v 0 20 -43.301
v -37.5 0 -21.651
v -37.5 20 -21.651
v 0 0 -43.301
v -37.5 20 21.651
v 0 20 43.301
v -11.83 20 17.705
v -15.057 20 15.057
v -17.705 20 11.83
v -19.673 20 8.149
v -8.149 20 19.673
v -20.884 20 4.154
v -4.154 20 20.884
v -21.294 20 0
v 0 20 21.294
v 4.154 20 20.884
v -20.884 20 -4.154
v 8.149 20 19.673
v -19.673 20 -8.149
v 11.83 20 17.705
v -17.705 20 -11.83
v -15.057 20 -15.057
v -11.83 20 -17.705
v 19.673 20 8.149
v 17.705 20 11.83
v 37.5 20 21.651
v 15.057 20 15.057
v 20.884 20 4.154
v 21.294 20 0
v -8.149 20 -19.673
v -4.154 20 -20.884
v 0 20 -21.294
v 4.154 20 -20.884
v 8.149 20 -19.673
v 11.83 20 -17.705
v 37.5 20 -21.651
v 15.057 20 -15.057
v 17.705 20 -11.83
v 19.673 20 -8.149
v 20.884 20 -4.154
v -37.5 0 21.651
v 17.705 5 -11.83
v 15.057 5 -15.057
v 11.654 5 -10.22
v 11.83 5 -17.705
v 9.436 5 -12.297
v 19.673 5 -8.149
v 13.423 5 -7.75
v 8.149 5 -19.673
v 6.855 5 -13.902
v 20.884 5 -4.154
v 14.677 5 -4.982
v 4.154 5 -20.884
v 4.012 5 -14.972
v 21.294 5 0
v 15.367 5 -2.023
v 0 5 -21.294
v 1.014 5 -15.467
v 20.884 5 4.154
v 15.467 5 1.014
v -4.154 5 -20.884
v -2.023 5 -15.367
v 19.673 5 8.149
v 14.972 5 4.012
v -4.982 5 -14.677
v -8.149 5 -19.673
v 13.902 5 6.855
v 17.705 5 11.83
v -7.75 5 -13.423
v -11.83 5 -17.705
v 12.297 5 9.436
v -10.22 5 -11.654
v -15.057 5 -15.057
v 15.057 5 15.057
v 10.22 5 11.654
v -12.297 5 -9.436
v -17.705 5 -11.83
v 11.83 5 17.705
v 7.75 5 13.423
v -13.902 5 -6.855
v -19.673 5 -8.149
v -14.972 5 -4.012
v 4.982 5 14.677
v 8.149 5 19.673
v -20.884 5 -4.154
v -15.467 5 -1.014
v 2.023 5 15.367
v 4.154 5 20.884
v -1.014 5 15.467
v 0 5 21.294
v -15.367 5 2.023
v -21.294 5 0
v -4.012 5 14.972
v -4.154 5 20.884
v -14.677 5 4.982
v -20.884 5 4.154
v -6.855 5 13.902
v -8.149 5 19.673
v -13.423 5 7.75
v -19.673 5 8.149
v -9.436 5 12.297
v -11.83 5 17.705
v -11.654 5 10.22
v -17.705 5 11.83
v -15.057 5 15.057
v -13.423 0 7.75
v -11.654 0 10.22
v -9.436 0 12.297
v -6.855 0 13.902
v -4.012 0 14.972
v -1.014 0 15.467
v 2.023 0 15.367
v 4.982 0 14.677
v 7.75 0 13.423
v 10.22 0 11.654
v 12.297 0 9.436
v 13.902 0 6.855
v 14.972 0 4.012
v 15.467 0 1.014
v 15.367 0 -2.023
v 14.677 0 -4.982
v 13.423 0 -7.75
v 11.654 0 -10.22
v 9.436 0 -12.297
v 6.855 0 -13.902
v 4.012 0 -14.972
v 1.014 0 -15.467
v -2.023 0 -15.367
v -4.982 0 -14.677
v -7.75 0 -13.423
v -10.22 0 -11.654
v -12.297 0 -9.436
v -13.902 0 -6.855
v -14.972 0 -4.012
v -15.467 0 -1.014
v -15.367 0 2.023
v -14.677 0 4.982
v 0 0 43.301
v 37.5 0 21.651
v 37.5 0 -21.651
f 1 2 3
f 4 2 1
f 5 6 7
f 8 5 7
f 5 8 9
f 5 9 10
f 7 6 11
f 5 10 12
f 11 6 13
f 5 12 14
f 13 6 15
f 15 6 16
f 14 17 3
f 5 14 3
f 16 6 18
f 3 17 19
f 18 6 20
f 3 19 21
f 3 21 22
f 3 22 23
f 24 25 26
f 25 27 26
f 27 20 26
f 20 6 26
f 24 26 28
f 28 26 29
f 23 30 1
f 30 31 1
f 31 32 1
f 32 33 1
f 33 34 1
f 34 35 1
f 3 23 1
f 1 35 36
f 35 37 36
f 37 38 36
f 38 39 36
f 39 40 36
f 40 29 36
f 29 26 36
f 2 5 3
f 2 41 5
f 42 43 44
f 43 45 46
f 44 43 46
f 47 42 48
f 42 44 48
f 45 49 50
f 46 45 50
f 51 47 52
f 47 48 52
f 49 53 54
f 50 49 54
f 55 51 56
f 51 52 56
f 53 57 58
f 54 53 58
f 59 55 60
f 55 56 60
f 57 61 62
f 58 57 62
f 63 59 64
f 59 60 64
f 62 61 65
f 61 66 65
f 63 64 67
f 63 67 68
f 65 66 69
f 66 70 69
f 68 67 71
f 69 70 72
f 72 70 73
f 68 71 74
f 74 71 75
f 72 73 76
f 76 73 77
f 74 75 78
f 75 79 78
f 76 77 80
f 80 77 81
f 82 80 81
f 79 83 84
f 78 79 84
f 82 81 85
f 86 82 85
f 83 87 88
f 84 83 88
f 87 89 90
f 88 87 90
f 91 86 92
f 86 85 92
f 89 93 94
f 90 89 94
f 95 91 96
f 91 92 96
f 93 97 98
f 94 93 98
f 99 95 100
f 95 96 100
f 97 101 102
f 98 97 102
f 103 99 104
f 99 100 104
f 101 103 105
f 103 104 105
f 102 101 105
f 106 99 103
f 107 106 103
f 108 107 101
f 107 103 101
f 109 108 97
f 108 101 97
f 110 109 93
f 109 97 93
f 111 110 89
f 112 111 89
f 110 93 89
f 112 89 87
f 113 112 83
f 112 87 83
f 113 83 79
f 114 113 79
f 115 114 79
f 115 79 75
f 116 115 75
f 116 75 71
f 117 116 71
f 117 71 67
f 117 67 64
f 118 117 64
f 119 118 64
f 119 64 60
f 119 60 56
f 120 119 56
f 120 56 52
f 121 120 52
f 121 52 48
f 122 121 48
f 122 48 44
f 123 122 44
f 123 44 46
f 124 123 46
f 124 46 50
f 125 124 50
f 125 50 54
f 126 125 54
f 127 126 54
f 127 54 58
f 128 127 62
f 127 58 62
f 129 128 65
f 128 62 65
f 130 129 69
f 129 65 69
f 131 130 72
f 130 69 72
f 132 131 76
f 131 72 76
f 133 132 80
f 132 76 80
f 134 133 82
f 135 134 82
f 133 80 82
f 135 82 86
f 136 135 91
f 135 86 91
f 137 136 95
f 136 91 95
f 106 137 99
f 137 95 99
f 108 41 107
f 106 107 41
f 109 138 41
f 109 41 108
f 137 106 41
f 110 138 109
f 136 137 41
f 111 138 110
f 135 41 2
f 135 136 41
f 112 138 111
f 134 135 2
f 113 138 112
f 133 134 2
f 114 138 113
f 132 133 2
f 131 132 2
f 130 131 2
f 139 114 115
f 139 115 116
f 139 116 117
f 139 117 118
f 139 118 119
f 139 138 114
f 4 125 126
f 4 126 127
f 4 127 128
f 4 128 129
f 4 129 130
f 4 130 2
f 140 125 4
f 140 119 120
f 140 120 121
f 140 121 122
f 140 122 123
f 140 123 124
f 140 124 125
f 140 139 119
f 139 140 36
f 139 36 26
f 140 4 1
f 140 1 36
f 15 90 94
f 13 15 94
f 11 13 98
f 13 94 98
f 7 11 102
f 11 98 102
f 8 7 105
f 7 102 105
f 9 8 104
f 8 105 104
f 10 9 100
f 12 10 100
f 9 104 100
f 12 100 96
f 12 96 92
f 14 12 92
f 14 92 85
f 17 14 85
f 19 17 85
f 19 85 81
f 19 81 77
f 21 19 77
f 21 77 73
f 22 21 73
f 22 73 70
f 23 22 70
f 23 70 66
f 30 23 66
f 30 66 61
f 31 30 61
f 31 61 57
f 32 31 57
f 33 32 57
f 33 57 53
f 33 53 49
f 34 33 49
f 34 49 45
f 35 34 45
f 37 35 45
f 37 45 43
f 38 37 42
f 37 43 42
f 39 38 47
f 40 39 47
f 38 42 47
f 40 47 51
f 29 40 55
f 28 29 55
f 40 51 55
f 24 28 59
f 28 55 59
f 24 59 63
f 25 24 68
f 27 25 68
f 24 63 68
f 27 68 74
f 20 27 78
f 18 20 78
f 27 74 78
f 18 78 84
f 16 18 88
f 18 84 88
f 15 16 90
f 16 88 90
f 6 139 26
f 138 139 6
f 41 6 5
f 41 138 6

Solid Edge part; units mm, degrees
sketch "Sketch1" plane through (0, 0, 0) normal (0, -1, 0) x (1, 0, 0)
  line L0 (37.5, 21.6506) -> (0, 43.3013)
  line L1 (0, 43.3013) -> (-37.5, 21.6506)
  line L2 (-37.5, 21.6506) -> (-37.5, -21.6506)
  line L3 (-37.5, -21.6506) -> (0, -43.3013)
  line L4 (0, -43.3013) -> (37.5, -21.6506)
  line L5 (37.5, -21.6506) -> (37.5, 21.6506)
  dimension "D1" = 37.5
  dimension "D2" = 43.3013
extrude "Protrusion1" add sketch "Sketch1" against normal blind 20
sketch "Sketch2" plane through (0, 20, 0) normal (0, 1, 0) x (-0.866, 0, 0.5)
  circle A0 centre (0, 0) radius 15.5
  dimension "D1" = 31
extrude "ExtrudedCutout_1" cut sketch "Sketch2" against normal blind 146.9275
hole "Hole_1" at (0, 20, 0) direction (0, -1, 0) diameter 42.587 depth 15 thread major 48 thread length 2
